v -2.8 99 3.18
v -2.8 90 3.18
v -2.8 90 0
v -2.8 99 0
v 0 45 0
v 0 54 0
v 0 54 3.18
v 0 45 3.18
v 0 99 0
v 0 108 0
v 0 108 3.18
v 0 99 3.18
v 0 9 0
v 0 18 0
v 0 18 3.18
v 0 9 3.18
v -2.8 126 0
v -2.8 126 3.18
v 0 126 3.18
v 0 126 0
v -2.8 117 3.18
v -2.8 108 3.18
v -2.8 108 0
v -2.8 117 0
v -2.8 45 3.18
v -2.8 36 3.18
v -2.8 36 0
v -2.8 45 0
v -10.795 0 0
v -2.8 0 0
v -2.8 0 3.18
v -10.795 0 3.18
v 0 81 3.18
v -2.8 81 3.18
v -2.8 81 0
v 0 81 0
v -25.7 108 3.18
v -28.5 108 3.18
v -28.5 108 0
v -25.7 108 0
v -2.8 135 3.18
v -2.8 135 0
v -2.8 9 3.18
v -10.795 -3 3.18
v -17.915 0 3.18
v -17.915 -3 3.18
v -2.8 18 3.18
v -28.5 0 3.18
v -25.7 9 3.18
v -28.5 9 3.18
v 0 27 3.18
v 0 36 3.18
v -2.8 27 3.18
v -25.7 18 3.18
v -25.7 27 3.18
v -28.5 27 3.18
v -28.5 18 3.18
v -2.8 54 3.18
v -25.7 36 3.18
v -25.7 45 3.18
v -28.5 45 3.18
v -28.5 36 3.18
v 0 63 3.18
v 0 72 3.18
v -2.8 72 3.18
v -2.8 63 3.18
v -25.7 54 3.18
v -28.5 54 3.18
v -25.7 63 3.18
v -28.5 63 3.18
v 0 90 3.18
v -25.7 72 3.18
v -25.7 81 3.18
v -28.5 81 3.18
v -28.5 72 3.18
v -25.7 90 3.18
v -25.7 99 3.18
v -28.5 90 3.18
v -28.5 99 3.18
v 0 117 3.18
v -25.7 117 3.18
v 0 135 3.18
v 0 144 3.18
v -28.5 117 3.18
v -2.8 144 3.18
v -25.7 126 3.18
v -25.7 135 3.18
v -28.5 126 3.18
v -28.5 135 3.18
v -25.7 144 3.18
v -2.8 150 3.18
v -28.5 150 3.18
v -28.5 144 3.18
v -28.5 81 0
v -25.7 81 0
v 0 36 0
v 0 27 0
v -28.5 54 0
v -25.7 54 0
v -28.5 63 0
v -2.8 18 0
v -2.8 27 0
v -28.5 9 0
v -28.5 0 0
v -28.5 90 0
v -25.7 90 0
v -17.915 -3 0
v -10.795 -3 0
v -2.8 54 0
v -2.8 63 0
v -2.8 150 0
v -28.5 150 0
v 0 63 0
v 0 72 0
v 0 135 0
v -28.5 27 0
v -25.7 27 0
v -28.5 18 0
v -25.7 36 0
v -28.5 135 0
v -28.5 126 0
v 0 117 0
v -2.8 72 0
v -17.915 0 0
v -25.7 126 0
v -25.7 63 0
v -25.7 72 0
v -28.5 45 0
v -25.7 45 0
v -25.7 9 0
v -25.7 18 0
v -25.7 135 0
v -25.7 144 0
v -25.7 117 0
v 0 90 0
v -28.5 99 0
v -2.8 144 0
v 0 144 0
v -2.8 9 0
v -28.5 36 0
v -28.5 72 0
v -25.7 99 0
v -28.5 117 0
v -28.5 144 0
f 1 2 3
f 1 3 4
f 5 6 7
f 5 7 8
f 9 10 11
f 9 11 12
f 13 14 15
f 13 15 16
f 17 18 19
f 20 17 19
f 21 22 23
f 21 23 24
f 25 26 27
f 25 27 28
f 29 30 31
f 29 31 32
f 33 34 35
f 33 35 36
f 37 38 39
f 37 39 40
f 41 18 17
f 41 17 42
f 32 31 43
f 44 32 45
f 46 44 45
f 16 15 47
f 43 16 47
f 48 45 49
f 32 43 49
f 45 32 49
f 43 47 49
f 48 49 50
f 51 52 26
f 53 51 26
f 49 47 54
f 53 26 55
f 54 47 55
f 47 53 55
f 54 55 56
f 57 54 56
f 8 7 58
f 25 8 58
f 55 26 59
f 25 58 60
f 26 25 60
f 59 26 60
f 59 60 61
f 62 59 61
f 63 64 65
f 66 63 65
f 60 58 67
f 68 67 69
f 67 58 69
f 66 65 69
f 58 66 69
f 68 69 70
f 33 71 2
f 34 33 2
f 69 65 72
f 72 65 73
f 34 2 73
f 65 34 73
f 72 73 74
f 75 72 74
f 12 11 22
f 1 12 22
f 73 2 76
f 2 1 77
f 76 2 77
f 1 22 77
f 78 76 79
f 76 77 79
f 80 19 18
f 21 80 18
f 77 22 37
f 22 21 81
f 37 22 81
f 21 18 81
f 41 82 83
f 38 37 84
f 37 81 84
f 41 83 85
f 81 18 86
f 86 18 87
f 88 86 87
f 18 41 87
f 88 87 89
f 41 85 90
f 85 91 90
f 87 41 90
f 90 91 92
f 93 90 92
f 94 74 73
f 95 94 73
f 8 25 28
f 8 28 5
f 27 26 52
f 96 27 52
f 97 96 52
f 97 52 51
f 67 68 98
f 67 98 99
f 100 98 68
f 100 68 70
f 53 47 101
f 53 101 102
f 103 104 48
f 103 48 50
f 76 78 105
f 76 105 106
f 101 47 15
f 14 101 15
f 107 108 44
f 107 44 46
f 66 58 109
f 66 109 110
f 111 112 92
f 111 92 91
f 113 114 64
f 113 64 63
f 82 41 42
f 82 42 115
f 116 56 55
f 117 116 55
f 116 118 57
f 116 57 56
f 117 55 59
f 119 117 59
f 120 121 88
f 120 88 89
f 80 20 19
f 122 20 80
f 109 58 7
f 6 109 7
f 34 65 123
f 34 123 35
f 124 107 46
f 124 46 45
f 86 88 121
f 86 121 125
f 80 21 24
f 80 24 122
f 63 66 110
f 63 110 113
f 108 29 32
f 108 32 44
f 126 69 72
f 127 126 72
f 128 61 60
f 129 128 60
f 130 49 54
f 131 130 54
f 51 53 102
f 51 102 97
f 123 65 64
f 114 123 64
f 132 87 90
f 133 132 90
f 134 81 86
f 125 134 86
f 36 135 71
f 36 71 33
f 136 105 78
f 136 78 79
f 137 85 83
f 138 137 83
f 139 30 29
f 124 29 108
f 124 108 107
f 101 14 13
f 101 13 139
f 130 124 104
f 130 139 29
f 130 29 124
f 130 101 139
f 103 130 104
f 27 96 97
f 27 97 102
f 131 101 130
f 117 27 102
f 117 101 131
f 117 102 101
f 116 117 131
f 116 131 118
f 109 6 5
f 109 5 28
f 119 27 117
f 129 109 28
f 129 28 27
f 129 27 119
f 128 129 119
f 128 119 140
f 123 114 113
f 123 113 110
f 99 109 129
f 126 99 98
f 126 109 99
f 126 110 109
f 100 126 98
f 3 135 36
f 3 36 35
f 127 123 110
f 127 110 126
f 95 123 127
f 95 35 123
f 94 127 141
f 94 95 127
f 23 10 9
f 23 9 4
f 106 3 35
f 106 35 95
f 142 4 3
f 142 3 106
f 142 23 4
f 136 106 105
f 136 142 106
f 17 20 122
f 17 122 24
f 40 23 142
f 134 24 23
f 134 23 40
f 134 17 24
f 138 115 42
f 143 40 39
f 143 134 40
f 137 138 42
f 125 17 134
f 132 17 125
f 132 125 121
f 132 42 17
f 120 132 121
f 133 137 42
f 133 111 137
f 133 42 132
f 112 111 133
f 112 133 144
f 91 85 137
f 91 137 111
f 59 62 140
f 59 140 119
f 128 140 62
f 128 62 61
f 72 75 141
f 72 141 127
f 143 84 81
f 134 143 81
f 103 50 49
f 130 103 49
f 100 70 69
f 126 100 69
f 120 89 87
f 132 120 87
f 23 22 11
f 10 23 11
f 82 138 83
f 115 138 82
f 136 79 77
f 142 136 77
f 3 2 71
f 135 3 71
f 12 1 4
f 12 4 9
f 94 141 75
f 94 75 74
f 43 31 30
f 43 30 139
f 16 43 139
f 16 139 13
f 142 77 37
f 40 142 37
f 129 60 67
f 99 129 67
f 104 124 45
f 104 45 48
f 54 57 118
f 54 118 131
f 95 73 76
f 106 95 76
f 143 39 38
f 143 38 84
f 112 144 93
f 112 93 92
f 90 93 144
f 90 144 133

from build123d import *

# Parameters (mm, degrees)
BOSS_EXTRUDE1_DEPTH = 3.18
SKETCH2_W           = 2.8
SKETCH2_H           = 9
SKETCH2_H_2         = 6
CUT_EXTRUDE1_DEPTH  = 153.716608134


with BuildPart() as part:
    # Sketch1 → Boss-Extrude1 (new body)
    with BuildSketch(Plane.XY):
        Polygon((-10.795, 0), (-10.795, -3), (-17.915, -3), (-17.915, 0), (-28.5, 0), (-28.5, 150), (0, 150), (0, 0), align=None)
    extrude(amount=BOSS_EXTRUDE1_DEPTH)

    # Sketch2 → Cut-Extrude1 (cut, through all)
    with BuildSketch(Plane.XY.offset(3.18)):
        with Locations((-27.1, 13.5)):
            Rectangle(SKETCH2_W, SKETCH2_H)
        with Locations((-27.1, 31.5)):
            Rectangle(SKETCH2_W, SKETCH2_H)
        with Locations((-27.1, 49.5)):
            Rectangle(SKETCH2_W, SKETCH2_H)
        with Locations((-27.1, 67.5)):
            Rectangle(SKETCH2_W, SKETCH2_H)
        with Locations((-27.1, 85.5)):
            Rectangle(SKETCH2_W, SKETCH2_H)
        with Locations((-27.1, 103.5)):
            Rectangle(SKETCH2_W, SKETCH2_H)
        with Locations((-27.1, 121.5)):
            Rectangle(SKETCH2_W, SKETCH2_H)
        with Locations((-27.1, 139.5)):
            Rectangle(SKETCH2_W, SKETCH2_H)
        with Locations((-1.4, 4.5)):
            Rectangle(SKETCH2_W, SKETCH2_H)
        with Locations((-1.4, 22.5)):
            Rectangle(SKETCH2_W, SKETCH2_H)
        with Locations((-1.4, 40.5)):
            Rectangle(SKETCH2_W, SKETCH2_H)
        with Locations((-1.4, 58.5)):
            Rectangle(SKETCH2_W, SKETCH2_H)
        with Locations((-1.4, 76.5)):
            Rectangle(SKETCH2_W, SKETCH2_H)
        with Locations((-1.4, 94.5)):
            Rectangle(SKETCH2_W, SKETCH2_H)
        with Locations((-1.4, 112.5)):
            Rectangle(SKETCH2_W, SKETCH2_H)
        with Locations((-1.4, 130.5)):
            Rectangle(SKETCH2_W, SKETCH2_H)
        with Locations((-1.4, 147)):
            Rectangle(SKETCH2_W, SKETCH2_H_2)
    extrude(amount=-CUT_EXTRUDE1_DEPTH, mode=Mode.SUBTRACT)


solid = part.part
